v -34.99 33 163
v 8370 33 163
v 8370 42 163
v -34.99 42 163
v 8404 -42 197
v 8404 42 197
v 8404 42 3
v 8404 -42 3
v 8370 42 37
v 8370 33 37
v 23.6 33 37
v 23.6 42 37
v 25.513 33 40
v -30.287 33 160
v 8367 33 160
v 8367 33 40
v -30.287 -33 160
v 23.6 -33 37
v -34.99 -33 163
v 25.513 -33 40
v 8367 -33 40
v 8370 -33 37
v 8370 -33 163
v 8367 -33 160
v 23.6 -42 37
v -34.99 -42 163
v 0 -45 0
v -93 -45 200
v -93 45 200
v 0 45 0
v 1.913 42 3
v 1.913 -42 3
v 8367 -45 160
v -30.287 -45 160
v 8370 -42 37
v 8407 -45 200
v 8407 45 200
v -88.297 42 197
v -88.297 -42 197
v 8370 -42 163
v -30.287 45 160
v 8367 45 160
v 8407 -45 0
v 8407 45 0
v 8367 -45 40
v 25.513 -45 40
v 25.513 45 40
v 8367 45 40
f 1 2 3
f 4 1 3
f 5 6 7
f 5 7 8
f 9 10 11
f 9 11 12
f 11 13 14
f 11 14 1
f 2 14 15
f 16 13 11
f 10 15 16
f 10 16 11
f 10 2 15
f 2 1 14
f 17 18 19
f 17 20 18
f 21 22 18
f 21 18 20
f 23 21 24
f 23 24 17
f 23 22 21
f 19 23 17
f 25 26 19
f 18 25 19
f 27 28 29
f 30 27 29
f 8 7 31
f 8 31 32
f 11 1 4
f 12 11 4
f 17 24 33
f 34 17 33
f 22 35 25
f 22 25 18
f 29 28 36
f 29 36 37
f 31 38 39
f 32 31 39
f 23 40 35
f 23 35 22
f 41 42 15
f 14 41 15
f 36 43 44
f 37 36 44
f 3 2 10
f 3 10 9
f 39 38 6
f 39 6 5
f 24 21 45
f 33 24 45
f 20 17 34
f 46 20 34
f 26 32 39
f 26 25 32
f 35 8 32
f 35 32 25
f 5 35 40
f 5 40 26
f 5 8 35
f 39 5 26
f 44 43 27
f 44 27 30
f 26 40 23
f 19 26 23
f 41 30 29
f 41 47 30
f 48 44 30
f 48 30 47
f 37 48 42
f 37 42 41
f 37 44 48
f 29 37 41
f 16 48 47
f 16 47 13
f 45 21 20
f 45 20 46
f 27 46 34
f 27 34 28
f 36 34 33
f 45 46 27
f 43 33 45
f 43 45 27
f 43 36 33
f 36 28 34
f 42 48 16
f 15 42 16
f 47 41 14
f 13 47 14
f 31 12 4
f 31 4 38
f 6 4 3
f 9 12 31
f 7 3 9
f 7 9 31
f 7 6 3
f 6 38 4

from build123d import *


with BuildPart() as f2:
    # F2: sweep along a path in F0
    with BuildLine(Plane.XZ) as f2_path:
        Line((0, 0), (8407, 0))
        Line((8407, 0), (8407, 200))
        Line((8407, 200), (-93, 200))
        Line((-93, 200), (0, 0))
    # F1 (on Right) → F2 (sweep)
    with BuildSketch(Plane.YZ):
        Polygon((-45, 0), (0, 0), (45, 0), (45, 40), (33, 40), (33, 37), (42, 37), (42, 3), (0, 3), (-42, 3), (-42, 37), (-33, 37), (-33, 40), (-45, 40), align=None)
    sweep(path=f2_path.line, transition=Transition.RIGHT)


solid = f2.part
